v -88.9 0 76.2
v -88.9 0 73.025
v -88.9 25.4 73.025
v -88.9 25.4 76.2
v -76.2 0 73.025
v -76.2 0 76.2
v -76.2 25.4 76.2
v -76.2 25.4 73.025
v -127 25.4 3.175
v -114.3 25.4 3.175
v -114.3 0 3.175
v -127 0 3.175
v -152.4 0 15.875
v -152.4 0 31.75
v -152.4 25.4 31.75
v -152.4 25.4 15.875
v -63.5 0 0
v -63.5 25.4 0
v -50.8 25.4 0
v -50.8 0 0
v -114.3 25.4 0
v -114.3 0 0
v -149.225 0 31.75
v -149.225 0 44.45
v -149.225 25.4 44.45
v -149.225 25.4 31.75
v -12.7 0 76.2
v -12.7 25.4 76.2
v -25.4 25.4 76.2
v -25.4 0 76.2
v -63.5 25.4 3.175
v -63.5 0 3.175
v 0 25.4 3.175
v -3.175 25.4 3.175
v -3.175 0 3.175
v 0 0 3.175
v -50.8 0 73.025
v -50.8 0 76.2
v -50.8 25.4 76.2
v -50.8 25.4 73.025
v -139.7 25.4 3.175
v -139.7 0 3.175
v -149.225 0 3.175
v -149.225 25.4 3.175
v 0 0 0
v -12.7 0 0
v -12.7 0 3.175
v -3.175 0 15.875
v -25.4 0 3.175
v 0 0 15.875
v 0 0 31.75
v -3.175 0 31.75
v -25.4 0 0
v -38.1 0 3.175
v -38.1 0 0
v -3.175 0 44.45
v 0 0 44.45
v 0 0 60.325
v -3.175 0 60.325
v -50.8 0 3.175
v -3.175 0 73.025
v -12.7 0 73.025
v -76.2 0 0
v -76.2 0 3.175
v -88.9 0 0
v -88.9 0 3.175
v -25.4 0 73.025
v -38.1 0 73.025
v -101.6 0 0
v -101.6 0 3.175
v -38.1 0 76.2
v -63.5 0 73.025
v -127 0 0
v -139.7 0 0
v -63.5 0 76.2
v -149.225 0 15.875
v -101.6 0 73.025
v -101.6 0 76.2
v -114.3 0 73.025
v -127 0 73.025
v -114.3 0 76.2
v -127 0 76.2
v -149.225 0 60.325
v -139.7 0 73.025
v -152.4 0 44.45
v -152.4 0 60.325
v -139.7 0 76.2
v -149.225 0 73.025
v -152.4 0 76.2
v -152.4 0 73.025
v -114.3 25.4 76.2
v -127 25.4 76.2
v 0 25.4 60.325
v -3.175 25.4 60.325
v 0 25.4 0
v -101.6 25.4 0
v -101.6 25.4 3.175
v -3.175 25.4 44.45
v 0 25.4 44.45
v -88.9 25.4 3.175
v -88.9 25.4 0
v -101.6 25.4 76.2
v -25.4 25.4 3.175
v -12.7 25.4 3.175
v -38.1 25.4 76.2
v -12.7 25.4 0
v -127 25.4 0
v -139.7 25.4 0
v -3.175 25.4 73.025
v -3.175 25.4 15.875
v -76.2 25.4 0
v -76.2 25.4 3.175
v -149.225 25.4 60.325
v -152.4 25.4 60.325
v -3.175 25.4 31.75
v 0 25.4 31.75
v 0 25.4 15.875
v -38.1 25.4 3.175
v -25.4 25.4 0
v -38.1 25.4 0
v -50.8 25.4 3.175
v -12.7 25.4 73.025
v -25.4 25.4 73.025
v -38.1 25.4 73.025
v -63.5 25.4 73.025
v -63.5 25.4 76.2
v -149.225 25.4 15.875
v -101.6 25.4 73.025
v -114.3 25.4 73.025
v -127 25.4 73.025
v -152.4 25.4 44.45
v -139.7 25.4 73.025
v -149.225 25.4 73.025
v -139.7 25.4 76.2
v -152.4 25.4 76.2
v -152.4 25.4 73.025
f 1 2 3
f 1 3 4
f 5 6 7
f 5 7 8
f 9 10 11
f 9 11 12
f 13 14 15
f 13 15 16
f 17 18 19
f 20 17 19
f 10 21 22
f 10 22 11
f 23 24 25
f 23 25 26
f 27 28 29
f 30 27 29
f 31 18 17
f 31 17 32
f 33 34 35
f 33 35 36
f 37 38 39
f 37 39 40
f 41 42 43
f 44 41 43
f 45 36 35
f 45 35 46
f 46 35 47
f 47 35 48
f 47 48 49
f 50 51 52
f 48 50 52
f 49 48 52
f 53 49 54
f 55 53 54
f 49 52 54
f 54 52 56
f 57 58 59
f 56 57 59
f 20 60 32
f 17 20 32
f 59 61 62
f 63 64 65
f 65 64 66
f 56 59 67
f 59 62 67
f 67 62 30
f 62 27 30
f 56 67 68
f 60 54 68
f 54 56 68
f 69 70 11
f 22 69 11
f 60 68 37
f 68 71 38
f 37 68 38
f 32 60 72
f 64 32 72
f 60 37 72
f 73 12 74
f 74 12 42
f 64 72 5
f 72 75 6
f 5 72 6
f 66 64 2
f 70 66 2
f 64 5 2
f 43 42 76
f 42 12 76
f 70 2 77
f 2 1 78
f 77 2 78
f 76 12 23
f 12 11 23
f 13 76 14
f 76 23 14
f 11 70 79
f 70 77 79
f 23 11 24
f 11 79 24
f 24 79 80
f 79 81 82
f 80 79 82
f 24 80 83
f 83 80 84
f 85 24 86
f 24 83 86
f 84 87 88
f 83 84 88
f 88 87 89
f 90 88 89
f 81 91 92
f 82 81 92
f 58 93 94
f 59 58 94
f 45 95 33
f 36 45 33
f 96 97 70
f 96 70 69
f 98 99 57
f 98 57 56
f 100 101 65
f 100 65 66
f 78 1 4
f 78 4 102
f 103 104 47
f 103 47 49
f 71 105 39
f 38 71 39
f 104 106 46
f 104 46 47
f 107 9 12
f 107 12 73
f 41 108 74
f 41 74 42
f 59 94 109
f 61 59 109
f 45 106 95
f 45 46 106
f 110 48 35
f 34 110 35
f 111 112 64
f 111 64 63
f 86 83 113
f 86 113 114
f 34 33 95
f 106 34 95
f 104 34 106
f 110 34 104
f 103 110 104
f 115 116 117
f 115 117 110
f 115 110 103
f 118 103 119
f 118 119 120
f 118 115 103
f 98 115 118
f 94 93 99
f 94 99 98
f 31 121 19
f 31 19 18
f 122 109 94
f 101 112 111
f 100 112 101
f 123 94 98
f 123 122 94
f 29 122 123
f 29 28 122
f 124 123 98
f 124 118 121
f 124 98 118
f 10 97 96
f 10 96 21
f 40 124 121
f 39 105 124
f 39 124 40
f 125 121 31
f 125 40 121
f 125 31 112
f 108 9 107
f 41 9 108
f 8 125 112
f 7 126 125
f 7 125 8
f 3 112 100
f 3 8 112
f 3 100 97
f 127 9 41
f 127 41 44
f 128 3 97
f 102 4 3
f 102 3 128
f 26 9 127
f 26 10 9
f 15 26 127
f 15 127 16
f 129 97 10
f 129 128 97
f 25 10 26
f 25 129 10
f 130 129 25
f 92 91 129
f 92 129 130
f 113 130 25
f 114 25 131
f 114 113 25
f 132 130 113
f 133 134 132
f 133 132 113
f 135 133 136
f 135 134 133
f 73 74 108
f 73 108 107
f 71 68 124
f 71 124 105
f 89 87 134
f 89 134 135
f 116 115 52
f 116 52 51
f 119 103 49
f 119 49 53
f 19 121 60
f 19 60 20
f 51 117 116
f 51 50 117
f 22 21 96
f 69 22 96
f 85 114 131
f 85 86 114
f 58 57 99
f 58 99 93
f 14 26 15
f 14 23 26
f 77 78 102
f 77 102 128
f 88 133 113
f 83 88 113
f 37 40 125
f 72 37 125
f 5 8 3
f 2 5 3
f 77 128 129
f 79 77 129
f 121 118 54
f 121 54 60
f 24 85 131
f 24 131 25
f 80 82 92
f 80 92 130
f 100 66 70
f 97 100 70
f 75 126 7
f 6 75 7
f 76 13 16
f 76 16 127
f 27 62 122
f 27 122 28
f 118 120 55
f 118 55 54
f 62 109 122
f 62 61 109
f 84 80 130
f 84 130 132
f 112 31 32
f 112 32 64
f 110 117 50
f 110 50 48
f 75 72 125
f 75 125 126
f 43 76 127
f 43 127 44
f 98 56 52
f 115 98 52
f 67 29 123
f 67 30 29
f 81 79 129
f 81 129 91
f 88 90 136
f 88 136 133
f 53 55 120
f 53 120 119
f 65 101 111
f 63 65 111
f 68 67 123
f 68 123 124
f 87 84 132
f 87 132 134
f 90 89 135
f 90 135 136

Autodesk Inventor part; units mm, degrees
ref_plane "YZ Plane" through (0, 0, 0) normal (1, 0, 0) x (0, 1, 0)
ref_plane "XZ Plane" through (0, 0, 0) normal (0, 1, 0) x (-1, 0, 0)
ref_plane "XY Plane" through (0, 0, 0) normal (0, 0, 1) x (1, 0, 0)
sketch "Sketch1" plane through (0, 0, 0) normal (0, 1, 0) x (-1, 0, 0)
  line L0 (0, 0) -> (0, 76.2)
  line L1 (0, 76.2) -> (152.4, 76.2)
  line L2 (152.4, 76.2) -> (152.4, 0)
  line L3 (152.4, 0) -> (0, 0)
  line L4 (139.7, 76.2) -> (127, 76.2)
  line L5 (127, 76.2) -> (127, 73.025)
  line L6 (127, 73.025) -> (139.7, 73.025)
  line L7 (139.7, 73.025) -> (139.7, 76.2)
  line L8 (114.3, 76.2) -> (101.6, 76.2)
  line L9 (101.6, 76.2) -> (101.6, 73.025)
  line L10 (101.6, 73.025) -> (114.3, 73.025)
  line L11 (114.3, 73.025) -> (114.3, 76.2)
  line L12 (88.9, 76.2) -> (76.2, 76.2)
  line L13 (76.2, 76.2) -> (76.2, 73.025)
  line L14 (76.2, 73.025) -> (88.9, 73.025)
  line L15 (88.9, 73.025) -> (88.9, 76.2)
  line L16 (63.5, 76.2) -> (50.8, 76.2)
  line L17 (50.8, 76.2) -> (50.8, 73.025)
  line L18 (50.8, 73.025) -> (63.5, 73.025)
  line L19 (63.5, 73.025) -> (63.5, 76.2)
  line L20 (38.1, 76.2) -> (25.4, 76.2)
  line L21 (25.4, 76.2) -> (25.4, 73.025)
  line L22 (25.4, 73.025) -> (38.1, 73.025)
  line L23 (38.1, 73.025) -> (38.1, 76.2)
  line L24 (12.7, 76.2) -> (0, 76.2)
  line L25 (0, 76.2) -> (0, 73.025)
  line L26 (0, 73.025) -> (12.7, 73.025)
  line L27 (12.7, 73.025) -> (12.7, 76.2)
  line L28 (152.4, 0) -> (139.7, 0)
  line L29 (139.7, 0) -> (139.7, 3.175)
  line L30 (139.7, 3.175) -> (152.4, 3.175)
  line L31 (152.4, 3.175) -> (152.4, 0)
  line L32 (127, 0) -> (114.3, 0)
  line L33 (114.3, 0) -> (114.3, 3.175)
  line L34 (114.3, 3.175) -> (127, 3.175)
  line L35 (127, 3.175) -> (127, 0)
  line L36 (101.6, 0) -> (88.9, 0)
  line L37 (88.9, 0) -> (88.9, 3.175)
  line L38 (88.9, 3.175) -> (101.6, 3.175)
  line L39 (101.6, 3.175) -> (101.6, 0)
  line L40 (76.2, 0) -> (63.5, 0)
  line L41 (63.5, 0) -> (63.5, 3.175)
  line L42 (63.5, 3.175) -> (76.2, 3.175)
  line L43 (76.2, 3.175) -> (76.2, 0)
  line L44 (50.8, 0) -> (38.1, 0)
  line L45 (38.1, 0) -> (38.1, 3.175)
  line L46 (38.1, 3.175) -> (50.8, 3.175)
  line L47 (50.8, 3.175) -> (50.8, 0)
  line L48 (25.4, 0) -> (12.7, 0)
  line L49 (12.7, 0) -> (12.7, 3.175)
  line L50 (12.7, 3.175) -> (25.4, 3.175)
  line L51 (25.4, 3.175) -> (25.4, 0)
  line L52 (152.4, 73.025) -> (149.225, 73.025)
  line L53 (149.225, 73.025) -> (149.225, 60.325)
  line L54 (149.225, 60.325) -> (152.4, 60.325)
  line L55 (152.4, 60.325) -> (152.4, 73.025)
  line L56 (152.4, 44.45) -> (149.225, 44.45)
  line L57 (149.225, 44.45) -> (149.225, 31.75)
  line L58 (149.225, 31.75) -> (152.4, 31.75)
  line L59 (152.4, 31.75) -> (152.4, 44.45)
  line L60 (152.4, 15.875) -> (149.225, 15.875)
  line L61 (149.225, 15.875) -> (149.225, 3.175)
  line L62 (149.225, 3.175) -> (152.4, 3.175)
  line L63 (152.4, 3.175) -> (152.4, 15.875)
  line L64 (0, 73.025) -> (0, 60.325)
  line L65 (0, 60.325) -> (3.175, 60.325)
  line L66 (3.175, 60.325) -> (3.175, 73.025)
  line L67 (3.175, 73.025) -> (0, 73.025)
  line L68 (0, 3.175) -> (0, 15.875)
  line L69 (0, 15.875) -> (3.175, 15.875)
  line L70 (3.175, 15.875) -> (3.175, 3.175)
  line L71 (3.175, 3.175) -> (0, 3.175)
  line L72 (0, 31.75) -> (0, 44.45)
  line L73 (0, 44.45) -> (3.175, 44.45)
  line L74 (3.175, 44.45) -> (3.175, 31.75)
  line L75 (3.175, 31.75) -> (0, 31.75)
  point P0 (149.225, 3.175)
  dimension "d176" = 76.2
  dimension "d177" = 152.4
  dimension "d178" = 12.7
  dimension "d179" = 3.175
  dimension "d180" = 12.7
  dimension "d181" = 12.7
  dimension "d182" = 3.175
  dimension "d183" = 12.7
  dimension "d184" = 3.175
  dimension "d185" = 12.7
  dimension "d186" = 3.175
  dimension "d187" = 12.7
  dimension "d188" = 3.175
  dimension "d189" = 12.7
  dimension "d190" = 12.7
  dimension "d191" = 12.7
  dimension "d192" = 12.7
  dimension "d193" = 12.7
  dimension "d194" = 3.175
  dimension "d195" = 12.7
  dimension "d196" = 12.7
  dimension "d197" = 3.175
  dimension "d198" = 12.7
  dimension "d199" = 3.175
  dimension "d200" = 12.7
  dimension "d201" = 3.175
  dimension "d202" = 12.7
  dimension "d203" = 3.175
  dimension "d204" = 12.7
  dimension "d205" = 12.7
  dimension "d206" = 12.7
  dimension "d207" = 12.7
  dimension "d208" = 3.175
  dimension "d209" = 12.7
  dimension "d210" = 3.175
  dimension "d211" = 12.7
  dimension "d212" = 12.7
  dimension "d213" = 3.175
  dimension "d214" = 12.7
  dimension "d215" = 3.175
  dimension "d216" = 3.175
  dimension "d217" = 12.7
  dimension "d218" = 15.875
  dimension "d219" = 3.175
  dimension "d220" = 12.7
  dimension "d222" = 3.175
  dimension "d223" = 12.7
  dimension "d224" = 3.175
  dimension "d225" = 12.7
  dimension "d226" = 3.175
  dimension "d227" = 3.175
  dimension "d228" = 12.7
  dimension "d229" = 3.175
  dimension "d230" = 15.875
extrude "Extrusion5" add sketch "Sketch1" along normal blind 25.4 contours L0 L71 L70 L69 L75 L74 L73 L65 L66 L26 L27 L1 L21 L22 L23 L17 L18 L19 L13 L14 L15 L9 L10 L11 L5 L6 L7 L2 L52 L53 L54 L56 L57 L58 L60 L61 L30 L29 L3 L35 L34 L33 L39 L38 L37 L43 L42 L41 L47 L46 L45 L51 L50 L49
properties part number "BackPanel"
